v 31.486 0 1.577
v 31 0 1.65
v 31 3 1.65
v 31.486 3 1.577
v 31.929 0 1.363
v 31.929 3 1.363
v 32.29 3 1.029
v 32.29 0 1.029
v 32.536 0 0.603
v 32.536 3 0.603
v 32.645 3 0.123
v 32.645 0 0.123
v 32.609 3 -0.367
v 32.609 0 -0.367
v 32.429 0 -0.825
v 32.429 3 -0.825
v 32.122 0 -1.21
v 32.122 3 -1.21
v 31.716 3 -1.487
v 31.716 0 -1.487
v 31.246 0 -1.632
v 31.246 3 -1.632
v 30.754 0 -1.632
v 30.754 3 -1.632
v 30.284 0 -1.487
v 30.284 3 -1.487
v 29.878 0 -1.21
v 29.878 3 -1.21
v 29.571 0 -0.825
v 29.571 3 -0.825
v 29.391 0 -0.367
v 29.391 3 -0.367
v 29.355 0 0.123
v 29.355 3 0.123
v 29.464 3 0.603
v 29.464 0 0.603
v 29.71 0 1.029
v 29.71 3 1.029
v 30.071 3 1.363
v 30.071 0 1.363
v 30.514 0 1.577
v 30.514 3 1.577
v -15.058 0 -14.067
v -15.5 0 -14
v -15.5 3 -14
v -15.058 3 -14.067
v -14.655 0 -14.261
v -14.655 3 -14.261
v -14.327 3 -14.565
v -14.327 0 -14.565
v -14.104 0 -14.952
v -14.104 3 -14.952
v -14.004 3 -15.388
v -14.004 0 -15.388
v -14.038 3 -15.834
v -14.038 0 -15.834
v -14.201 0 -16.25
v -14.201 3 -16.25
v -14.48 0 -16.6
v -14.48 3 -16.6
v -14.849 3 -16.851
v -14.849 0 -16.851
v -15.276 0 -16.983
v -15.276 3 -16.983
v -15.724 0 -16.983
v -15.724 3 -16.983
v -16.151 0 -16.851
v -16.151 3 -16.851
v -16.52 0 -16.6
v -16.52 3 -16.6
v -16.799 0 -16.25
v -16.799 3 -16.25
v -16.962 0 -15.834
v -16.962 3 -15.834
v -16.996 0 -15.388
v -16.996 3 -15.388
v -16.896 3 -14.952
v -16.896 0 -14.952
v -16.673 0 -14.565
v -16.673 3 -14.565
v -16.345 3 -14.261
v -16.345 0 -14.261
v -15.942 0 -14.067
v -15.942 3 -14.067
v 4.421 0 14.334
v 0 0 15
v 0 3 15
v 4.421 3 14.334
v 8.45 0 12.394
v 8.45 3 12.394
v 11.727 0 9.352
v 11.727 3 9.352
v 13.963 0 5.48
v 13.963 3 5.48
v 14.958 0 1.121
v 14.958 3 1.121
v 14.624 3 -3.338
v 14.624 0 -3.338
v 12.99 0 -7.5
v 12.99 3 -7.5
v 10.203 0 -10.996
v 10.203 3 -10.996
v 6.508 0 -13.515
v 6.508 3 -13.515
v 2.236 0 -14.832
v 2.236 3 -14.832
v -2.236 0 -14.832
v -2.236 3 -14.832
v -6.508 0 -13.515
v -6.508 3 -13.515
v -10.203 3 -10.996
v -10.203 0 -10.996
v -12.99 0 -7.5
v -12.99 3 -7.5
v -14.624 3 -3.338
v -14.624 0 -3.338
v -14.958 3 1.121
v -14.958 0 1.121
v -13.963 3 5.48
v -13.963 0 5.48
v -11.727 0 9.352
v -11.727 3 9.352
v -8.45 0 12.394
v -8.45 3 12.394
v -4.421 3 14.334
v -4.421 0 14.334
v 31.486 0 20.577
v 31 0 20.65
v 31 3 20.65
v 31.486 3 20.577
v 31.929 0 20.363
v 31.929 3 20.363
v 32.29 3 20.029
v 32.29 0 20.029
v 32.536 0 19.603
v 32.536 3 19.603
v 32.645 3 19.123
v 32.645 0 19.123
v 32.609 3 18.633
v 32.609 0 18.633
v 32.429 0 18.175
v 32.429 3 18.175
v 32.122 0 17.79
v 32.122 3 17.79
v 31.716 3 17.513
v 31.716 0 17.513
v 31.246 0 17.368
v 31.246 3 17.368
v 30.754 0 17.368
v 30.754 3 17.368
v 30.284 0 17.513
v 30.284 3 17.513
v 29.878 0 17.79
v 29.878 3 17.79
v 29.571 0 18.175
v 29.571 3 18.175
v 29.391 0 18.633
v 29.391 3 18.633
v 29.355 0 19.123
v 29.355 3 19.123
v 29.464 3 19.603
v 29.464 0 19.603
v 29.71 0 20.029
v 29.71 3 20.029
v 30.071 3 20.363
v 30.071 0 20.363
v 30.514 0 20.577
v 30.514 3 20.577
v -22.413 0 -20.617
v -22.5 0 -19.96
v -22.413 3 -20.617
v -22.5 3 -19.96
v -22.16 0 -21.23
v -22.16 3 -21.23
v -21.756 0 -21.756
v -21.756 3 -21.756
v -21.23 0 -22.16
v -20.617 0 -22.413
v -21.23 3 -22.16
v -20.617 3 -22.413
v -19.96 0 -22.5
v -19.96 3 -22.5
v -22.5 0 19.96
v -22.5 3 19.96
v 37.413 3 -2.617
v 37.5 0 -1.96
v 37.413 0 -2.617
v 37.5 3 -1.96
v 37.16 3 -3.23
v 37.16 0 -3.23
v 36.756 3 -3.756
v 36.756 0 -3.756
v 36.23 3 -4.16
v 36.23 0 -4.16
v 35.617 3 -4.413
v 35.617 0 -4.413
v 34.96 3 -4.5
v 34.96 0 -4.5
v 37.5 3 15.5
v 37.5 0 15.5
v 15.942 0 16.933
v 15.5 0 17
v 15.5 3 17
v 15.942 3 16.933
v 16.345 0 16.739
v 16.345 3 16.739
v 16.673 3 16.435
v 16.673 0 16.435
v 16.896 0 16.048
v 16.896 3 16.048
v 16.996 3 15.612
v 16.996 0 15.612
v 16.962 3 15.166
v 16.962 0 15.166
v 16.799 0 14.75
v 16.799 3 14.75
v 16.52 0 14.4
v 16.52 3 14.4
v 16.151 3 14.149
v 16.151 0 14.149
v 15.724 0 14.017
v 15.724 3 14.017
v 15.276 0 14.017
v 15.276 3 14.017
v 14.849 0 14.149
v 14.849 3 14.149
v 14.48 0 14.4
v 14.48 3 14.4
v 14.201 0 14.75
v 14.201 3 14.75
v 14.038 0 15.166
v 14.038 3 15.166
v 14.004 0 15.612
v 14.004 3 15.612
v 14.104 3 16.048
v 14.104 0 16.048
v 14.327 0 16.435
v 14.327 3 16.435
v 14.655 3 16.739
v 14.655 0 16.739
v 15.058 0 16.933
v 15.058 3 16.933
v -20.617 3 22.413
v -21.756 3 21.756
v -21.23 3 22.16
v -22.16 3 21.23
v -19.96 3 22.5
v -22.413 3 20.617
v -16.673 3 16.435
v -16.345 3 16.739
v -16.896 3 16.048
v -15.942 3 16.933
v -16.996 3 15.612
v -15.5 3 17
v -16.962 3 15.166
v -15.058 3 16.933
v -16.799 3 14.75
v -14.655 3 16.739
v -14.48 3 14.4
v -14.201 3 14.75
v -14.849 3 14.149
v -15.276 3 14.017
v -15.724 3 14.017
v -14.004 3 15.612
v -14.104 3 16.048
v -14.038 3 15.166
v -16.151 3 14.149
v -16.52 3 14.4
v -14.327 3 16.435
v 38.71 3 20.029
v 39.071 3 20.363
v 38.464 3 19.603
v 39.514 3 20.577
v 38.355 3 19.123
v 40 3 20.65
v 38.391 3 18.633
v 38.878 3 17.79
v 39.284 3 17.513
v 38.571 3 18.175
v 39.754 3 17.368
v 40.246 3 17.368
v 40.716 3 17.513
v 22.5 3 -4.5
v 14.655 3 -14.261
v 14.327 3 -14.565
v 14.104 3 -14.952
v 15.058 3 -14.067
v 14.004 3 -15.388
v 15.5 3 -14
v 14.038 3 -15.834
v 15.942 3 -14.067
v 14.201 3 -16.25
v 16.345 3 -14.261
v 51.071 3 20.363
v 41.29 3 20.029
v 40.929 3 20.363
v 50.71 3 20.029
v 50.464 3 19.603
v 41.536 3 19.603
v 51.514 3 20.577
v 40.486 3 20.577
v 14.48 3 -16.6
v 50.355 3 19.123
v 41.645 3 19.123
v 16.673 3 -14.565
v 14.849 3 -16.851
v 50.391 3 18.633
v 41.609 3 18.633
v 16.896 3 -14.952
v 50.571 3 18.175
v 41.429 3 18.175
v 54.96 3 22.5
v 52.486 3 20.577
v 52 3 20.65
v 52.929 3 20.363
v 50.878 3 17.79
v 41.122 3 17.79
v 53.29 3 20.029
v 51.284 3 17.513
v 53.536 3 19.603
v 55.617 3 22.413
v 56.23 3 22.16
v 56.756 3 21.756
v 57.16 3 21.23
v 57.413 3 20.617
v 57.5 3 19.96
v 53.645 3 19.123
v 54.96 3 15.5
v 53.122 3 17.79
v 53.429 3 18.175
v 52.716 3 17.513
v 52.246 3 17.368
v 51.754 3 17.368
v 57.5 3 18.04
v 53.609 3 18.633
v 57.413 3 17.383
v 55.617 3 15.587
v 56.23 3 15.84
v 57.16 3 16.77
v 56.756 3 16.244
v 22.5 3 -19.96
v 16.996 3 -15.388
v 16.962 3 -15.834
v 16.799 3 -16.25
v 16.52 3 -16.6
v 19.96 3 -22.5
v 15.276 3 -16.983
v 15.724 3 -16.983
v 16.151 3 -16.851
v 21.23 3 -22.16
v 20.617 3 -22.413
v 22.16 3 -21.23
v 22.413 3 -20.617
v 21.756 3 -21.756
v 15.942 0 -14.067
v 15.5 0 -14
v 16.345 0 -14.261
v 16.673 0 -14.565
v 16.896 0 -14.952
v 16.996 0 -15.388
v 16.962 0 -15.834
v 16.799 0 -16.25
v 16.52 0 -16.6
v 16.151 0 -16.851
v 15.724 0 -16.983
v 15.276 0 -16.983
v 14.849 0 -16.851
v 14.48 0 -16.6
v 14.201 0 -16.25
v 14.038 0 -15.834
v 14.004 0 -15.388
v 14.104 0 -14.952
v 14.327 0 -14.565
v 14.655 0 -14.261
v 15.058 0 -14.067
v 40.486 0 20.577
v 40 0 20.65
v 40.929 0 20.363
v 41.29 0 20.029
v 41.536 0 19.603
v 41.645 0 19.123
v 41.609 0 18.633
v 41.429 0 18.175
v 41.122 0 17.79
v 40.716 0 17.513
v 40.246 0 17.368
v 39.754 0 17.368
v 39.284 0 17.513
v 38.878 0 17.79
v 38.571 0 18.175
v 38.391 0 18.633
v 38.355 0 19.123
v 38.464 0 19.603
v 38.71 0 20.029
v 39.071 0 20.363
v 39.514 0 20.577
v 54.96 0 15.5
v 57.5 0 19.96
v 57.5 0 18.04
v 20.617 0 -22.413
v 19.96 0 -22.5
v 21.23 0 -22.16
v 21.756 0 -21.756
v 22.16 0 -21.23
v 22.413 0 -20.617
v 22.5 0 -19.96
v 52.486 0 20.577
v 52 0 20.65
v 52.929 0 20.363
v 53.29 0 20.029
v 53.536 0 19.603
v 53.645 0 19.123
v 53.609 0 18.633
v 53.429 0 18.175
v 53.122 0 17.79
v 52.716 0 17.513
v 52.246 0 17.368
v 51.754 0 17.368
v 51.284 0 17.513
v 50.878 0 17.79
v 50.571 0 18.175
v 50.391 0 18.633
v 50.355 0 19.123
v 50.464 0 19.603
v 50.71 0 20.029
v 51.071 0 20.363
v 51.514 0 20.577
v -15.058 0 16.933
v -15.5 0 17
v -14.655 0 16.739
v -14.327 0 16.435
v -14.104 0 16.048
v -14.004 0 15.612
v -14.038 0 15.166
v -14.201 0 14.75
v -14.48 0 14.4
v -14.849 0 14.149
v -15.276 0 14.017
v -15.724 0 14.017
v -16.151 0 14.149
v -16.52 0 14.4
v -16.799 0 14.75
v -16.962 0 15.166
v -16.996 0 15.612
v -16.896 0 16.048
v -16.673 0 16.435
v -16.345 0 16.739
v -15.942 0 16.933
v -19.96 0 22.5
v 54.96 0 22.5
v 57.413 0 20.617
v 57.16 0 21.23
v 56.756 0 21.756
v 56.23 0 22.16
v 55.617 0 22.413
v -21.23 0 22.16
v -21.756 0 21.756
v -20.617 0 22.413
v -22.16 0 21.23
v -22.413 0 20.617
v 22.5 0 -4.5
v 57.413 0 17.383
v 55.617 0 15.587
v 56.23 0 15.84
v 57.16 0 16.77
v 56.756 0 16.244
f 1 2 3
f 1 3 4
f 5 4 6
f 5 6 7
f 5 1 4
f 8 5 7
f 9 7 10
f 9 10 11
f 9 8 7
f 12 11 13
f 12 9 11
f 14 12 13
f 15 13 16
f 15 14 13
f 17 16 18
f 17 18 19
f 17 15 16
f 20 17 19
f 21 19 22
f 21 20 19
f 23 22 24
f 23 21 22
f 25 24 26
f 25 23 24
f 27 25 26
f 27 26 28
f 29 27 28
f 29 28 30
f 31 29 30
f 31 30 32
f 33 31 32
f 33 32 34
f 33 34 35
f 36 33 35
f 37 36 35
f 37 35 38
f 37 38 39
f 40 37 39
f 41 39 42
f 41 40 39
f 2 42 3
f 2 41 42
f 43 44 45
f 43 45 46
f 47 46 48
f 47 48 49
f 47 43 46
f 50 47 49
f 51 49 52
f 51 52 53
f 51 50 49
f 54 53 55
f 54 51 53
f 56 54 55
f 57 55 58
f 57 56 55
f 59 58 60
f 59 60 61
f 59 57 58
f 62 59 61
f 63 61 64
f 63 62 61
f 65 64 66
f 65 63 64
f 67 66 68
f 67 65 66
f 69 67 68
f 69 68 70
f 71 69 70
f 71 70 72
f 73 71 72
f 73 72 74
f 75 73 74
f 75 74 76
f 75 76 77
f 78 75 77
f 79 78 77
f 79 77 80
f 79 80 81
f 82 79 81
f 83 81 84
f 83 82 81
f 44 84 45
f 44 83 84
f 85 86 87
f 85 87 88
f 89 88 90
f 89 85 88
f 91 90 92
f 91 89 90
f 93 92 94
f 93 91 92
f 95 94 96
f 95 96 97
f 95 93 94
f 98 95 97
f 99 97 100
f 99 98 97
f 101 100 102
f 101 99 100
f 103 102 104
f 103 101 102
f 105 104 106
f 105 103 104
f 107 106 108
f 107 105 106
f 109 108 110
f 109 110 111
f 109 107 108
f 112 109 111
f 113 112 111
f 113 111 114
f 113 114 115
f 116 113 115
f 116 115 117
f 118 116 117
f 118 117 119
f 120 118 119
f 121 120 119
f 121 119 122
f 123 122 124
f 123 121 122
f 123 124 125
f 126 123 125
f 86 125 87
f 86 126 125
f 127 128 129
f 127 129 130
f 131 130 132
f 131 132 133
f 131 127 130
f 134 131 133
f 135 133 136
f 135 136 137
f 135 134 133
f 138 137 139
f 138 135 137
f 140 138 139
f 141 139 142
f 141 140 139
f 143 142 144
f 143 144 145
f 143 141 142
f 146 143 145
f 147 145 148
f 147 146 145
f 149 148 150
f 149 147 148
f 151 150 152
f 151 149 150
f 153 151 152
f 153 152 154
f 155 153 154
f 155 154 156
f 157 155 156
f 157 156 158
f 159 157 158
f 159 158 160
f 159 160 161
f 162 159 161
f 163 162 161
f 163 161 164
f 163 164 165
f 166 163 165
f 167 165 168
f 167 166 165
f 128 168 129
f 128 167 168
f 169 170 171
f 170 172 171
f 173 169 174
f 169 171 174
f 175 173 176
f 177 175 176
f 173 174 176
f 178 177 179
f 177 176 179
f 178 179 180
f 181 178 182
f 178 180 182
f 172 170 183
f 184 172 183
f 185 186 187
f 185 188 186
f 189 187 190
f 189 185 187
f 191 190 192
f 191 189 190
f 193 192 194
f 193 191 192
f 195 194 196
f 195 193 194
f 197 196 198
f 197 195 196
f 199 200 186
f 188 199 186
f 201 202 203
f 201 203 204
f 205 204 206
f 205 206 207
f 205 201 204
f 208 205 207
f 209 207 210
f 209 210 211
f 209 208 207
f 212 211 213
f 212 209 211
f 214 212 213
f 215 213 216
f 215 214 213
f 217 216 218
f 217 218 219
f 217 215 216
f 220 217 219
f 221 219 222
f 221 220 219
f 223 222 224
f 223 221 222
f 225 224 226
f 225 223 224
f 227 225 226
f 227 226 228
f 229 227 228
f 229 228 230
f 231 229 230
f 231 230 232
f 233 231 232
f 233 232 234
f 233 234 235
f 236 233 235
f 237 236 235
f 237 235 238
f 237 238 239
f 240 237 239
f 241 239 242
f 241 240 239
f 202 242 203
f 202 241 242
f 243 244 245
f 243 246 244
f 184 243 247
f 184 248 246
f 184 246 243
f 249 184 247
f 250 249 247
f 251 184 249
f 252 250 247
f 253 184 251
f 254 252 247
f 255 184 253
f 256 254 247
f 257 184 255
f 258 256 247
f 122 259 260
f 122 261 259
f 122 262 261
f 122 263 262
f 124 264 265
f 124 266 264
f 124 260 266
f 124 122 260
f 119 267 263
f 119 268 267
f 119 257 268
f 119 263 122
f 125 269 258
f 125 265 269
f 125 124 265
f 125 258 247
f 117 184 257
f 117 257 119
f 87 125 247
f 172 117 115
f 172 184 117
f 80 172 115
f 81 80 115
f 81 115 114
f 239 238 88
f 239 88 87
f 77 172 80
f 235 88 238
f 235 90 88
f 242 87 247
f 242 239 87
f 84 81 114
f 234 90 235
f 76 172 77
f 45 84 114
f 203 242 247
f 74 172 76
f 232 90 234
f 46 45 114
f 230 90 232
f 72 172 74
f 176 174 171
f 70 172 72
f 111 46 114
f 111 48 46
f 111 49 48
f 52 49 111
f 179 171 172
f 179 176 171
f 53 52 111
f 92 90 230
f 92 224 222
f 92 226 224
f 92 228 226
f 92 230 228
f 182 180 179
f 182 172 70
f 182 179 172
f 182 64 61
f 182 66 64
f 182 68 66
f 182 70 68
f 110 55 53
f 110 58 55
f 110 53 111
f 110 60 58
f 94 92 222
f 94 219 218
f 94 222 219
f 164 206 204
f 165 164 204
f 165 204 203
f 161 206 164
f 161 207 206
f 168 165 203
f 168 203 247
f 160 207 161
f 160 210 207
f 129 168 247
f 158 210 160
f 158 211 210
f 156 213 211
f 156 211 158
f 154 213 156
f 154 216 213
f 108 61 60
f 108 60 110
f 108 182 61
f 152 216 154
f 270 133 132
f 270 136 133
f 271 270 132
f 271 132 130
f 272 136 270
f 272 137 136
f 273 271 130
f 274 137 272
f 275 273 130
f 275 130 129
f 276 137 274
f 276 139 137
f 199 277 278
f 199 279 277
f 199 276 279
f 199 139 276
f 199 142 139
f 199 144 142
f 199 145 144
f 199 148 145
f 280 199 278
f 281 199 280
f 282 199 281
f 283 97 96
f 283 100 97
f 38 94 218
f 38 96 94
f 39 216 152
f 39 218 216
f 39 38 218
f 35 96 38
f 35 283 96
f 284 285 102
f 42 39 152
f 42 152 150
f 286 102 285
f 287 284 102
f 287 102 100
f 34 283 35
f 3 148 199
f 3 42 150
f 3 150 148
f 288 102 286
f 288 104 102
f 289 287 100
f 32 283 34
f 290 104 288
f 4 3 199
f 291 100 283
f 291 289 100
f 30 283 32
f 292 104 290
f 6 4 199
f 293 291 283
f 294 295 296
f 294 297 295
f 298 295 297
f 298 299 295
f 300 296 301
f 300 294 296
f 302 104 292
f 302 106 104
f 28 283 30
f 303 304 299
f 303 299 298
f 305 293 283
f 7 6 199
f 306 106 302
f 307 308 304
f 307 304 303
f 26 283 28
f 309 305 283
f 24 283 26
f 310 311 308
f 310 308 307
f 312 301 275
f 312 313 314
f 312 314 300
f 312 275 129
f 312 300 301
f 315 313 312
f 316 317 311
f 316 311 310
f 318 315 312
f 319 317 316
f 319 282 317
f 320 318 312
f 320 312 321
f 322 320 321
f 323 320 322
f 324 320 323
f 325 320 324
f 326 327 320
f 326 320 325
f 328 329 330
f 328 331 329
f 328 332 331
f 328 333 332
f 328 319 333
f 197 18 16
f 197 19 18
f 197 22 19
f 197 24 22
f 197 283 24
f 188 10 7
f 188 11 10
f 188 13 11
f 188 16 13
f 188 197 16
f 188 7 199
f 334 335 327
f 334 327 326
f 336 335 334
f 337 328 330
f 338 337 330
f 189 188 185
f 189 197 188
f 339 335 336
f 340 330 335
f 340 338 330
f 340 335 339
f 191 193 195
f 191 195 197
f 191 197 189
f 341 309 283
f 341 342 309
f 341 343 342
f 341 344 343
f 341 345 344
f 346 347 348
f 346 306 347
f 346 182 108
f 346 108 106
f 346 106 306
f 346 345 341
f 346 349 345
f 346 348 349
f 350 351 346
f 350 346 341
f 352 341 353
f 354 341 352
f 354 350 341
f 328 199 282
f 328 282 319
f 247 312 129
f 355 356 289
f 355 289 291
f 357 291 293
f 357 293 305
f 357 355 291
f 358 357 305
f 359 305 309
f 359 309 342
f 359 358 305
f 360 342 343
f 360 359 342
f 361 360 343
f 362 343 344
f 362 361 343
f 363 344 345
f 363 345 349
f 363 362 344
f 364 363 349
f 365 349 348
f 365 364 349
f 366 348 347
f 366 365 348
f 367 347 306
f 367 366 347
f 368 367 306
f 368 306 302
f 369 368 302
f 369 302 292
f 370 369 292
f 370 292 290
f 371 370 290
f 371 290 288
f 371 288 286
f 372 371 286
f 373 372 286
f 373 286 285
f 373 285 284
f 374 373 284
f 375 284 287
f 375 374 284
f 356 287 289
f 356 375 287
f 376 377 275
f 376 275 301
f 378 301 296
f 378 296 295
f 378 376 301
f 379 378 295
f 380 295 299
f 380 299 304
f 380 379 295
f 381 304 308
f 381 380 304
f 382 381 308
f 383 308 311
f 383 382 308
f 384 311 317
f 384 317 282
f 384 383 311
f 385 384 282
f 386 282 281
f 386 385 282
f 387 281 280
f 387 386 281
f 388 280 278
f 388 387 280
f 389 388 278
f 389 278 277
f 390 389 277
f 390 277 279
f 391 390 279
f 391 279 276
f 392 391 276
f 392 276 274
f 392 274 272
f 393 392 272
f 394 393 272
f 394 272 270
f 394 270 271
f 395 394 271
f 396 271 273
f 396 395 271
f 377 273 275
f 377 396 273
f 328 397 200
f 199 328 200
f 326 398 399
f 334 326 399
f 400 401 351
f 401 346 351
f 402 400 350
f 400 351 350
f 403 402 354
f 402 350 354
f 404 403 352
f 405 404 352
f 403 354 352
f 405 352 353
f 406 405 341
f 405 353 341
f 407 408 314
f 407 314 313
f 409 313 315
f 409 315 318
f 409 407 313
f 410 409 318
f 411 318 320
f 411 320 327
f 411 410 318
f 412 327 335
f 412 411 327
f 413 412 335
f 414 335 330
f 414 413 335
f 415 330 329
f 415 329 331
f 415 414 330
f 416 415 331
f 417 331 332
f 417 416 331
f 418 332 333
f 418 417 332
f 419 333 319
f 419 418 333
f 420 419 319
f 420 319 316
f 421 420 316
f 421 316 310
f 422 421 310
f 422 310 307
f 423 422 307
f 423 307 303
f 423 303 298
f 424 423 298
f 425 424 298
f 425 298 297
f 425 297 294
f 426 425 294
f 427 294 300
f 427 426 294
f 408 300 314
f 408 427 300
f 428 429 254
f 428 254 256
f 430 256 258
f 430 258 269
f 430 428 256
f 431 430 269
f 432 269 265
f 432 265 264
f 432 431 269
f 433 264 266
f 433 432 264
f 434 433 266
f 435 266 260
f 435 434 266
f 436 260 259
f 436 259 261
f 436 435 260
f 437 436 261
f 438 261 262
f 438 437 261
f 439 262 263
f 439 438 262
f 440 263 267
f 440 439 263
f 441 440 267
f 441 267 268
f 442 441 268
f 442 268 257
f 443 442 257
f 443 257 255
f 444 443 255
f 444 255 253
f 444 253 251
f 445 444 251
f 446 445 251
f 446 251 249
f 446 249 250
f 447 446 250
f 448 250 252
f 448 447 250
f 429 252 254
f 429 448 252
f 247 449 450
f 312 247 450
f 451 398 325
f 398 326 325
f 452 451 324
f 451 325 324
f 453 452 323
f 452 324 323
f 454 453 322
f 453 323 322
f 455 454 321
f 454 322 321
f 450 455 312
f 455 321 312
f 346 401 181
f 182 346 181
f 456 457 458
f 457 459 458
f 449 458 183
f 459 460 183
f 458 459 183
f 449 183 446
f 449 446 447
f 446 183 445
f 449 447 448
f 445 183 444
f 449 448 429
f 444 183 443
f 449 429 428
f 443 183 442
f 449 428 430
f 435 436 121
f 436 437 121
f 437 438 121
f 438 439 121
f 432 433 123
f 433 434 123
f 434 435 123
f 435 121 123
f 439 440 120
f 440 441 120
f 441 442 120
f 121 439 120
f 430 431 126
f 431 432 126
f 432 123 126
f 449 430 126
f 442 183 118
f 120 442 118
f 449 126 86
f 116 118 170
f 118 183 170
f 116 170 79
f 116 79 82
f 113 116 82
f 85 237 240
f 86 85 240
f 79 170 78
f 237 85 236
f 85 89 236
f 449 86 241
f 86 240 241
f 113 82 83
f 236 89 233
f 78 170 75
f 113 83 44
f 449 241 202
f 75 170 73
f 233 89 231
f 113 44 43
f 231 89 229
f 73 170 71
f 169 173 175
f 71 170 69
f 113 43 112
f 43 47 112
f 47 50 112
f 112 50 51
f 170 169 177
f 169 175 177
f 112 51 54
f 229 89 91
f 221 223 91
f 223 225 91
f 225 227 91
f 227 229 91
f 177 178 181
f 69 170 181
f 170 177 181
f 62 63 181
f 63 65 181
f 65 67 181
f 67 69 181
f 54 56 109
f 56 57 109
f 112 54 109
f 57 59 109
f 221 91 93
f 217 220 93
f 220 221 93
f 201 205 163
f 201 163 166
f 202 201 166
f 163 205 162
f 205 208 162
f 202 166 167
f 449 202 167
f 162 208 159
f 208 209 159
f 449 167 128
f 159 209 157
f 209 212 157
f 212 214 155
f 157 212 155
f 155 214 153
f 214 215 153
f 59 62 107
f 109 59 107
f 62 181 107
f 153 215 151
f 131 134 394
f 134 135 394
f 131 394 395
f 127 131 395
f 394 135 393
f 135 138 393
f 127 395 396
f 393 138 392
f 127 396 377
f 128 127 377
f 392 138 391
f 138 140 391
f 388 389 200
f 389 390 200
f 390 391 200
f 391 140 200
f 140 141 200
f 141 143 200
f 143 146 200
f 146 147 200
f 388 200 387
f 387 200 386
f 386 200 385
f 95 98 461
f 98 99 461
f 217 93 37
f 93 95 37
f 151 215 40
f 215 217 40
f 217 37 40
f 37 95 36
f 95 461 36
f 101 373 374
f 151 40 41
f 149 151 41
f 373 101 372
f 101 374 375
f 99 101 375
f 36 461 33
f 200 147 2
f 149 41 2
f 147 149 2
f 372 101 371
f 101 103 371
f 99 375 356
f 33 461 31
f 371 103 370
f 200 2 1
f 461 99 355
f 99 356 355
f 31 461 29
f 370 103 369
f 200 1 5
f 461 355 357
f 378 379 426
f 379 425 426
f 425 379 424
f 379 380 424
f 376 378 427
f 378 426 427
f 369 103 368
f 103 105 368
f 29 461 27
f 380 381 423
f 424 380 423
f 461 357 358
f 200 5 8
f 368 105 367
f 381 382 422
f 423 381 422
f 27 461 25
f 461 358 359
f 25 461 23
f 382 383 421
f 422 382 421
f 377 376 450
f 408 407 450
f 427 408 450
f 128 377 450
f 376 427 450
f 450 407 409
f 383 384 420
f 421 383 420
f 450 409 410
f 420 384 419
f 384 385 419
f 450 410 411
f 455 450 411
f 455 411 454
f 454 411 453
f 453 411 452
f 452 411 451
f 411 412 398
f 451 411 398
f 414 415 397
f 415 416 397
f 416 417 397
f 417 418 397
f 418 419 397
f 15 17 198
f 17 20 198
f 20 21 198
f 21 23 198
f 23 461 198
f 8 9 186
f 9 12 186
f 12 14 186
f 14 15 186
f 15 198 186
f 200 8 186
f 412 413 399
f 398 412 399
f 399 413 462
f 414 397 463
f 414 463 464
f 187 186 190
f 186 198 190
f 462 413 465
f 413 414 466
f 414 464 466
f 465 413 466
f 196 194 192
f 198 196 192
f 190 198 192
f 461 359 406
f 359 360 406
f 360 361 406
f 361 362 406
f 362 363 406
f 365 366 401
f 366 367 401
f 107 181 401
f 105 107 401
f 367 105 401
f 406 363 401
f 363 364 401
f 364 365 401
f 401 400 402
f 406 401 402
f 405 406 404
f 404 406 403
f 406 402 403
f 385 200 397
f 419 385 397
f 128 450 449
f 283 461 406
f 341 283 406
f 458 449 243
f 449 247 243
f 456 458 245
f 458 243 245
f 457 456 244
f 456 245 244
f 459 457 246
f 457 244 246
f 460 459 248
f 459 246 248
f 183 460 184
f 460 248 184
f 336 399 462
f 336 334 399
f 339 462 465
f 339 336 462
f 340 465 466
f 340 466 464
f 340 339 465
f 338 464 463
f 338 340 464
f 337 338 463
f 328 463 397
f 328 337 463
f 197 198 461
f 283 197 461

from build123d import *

# Parameters (mm, degrees)
SKETCH1_R       = 15
SKETCH1_R_2     = 1.5
SKETCH1_R_3     = 1.65
MAIN_BODY_DEPTH = 3
FILLET_2_R      = 2.54


with BuildPart() as part:
    # Sketch1 → Main Body (new body)
    with BuildSketch(Plane(origin=(0, 0, 0), x_dir=(1, 0, 0), z_dir=(0, 1, 0))):
        Polygon((22.5, -22.5), (57.5, -22.5), (57.5, -15.5), (37.5, -15.5), (37.5, 4.5), (22.5, 4.5), (22.5, 22.5), (-22.5, 22.5), (-22.5, -22.5), align=None)
        with Locations(Location((0, 0, 0), (0, 0, 270))):
            Circle(SKETCH1_R, mode=Mode.SUBTRACT)
        with Locations(Location((15.5, 15.5, 0), (0, 0, 270))):
            Circle(SKETCH1_R_2, mode=Mode.SUBTRACT)
        with Locations(Location((15.5, -15.5, 0), (0, 0, 270))):
            Circle(SKETCH1_R_2, mode=Mode.SUBTRACT)
        with Locations(Location((-15.5, -15.5, 0), (0, 0, 270))):
            Circle(SKETCH1_R_2, mode=Mode.SUBTRACT)
        with Locations(Location((-15.5, 15.5, 0), (0, 0, 270))):
            Circle(SKETCH1_R_2, mode=Mode.SUBTRACT)
        with Locations(Location((31, 0, 0), (0, 0, 270))):
            Circle(SKETCH1_R_3, mode=Mode.SUBTRACT)
        with Locations(Location((31, -19, 0), (0, 0, 270))):
            Circle(SKETCH1_R_3, mode=Mode.SUBTRACT)
        with Locations(Location((40, -19, 0), (0, 0, 270))):
            Circle(SKETCH1_R_3, mode=Mode.SUBTRACT)
        with Locations(Location((52, -19, 0), (0, 0, 270))):
            Circle(SKETCH1_R_3, mode=Mode.SUBTRACT)
    extrude(amount=MAIN_BODY_DEPTH)

    # FIllet 2
    fillet_2_edges = [part.edges().sort_by_distance(p)[0] for p in [
        (37.5, 1.5, -4.5),
        (57.5, 1.5, 15.5),
        (57.5, 1.5, 22.5),
        (-22.5, 1.5, 22.5),
        (-22.5, 1.5, -22.5),
        (22.5, 1.5, -22.5),
    ]]
    fillet(fillet_2_edges, radius=FILLET_2_R)


solid = part.part
